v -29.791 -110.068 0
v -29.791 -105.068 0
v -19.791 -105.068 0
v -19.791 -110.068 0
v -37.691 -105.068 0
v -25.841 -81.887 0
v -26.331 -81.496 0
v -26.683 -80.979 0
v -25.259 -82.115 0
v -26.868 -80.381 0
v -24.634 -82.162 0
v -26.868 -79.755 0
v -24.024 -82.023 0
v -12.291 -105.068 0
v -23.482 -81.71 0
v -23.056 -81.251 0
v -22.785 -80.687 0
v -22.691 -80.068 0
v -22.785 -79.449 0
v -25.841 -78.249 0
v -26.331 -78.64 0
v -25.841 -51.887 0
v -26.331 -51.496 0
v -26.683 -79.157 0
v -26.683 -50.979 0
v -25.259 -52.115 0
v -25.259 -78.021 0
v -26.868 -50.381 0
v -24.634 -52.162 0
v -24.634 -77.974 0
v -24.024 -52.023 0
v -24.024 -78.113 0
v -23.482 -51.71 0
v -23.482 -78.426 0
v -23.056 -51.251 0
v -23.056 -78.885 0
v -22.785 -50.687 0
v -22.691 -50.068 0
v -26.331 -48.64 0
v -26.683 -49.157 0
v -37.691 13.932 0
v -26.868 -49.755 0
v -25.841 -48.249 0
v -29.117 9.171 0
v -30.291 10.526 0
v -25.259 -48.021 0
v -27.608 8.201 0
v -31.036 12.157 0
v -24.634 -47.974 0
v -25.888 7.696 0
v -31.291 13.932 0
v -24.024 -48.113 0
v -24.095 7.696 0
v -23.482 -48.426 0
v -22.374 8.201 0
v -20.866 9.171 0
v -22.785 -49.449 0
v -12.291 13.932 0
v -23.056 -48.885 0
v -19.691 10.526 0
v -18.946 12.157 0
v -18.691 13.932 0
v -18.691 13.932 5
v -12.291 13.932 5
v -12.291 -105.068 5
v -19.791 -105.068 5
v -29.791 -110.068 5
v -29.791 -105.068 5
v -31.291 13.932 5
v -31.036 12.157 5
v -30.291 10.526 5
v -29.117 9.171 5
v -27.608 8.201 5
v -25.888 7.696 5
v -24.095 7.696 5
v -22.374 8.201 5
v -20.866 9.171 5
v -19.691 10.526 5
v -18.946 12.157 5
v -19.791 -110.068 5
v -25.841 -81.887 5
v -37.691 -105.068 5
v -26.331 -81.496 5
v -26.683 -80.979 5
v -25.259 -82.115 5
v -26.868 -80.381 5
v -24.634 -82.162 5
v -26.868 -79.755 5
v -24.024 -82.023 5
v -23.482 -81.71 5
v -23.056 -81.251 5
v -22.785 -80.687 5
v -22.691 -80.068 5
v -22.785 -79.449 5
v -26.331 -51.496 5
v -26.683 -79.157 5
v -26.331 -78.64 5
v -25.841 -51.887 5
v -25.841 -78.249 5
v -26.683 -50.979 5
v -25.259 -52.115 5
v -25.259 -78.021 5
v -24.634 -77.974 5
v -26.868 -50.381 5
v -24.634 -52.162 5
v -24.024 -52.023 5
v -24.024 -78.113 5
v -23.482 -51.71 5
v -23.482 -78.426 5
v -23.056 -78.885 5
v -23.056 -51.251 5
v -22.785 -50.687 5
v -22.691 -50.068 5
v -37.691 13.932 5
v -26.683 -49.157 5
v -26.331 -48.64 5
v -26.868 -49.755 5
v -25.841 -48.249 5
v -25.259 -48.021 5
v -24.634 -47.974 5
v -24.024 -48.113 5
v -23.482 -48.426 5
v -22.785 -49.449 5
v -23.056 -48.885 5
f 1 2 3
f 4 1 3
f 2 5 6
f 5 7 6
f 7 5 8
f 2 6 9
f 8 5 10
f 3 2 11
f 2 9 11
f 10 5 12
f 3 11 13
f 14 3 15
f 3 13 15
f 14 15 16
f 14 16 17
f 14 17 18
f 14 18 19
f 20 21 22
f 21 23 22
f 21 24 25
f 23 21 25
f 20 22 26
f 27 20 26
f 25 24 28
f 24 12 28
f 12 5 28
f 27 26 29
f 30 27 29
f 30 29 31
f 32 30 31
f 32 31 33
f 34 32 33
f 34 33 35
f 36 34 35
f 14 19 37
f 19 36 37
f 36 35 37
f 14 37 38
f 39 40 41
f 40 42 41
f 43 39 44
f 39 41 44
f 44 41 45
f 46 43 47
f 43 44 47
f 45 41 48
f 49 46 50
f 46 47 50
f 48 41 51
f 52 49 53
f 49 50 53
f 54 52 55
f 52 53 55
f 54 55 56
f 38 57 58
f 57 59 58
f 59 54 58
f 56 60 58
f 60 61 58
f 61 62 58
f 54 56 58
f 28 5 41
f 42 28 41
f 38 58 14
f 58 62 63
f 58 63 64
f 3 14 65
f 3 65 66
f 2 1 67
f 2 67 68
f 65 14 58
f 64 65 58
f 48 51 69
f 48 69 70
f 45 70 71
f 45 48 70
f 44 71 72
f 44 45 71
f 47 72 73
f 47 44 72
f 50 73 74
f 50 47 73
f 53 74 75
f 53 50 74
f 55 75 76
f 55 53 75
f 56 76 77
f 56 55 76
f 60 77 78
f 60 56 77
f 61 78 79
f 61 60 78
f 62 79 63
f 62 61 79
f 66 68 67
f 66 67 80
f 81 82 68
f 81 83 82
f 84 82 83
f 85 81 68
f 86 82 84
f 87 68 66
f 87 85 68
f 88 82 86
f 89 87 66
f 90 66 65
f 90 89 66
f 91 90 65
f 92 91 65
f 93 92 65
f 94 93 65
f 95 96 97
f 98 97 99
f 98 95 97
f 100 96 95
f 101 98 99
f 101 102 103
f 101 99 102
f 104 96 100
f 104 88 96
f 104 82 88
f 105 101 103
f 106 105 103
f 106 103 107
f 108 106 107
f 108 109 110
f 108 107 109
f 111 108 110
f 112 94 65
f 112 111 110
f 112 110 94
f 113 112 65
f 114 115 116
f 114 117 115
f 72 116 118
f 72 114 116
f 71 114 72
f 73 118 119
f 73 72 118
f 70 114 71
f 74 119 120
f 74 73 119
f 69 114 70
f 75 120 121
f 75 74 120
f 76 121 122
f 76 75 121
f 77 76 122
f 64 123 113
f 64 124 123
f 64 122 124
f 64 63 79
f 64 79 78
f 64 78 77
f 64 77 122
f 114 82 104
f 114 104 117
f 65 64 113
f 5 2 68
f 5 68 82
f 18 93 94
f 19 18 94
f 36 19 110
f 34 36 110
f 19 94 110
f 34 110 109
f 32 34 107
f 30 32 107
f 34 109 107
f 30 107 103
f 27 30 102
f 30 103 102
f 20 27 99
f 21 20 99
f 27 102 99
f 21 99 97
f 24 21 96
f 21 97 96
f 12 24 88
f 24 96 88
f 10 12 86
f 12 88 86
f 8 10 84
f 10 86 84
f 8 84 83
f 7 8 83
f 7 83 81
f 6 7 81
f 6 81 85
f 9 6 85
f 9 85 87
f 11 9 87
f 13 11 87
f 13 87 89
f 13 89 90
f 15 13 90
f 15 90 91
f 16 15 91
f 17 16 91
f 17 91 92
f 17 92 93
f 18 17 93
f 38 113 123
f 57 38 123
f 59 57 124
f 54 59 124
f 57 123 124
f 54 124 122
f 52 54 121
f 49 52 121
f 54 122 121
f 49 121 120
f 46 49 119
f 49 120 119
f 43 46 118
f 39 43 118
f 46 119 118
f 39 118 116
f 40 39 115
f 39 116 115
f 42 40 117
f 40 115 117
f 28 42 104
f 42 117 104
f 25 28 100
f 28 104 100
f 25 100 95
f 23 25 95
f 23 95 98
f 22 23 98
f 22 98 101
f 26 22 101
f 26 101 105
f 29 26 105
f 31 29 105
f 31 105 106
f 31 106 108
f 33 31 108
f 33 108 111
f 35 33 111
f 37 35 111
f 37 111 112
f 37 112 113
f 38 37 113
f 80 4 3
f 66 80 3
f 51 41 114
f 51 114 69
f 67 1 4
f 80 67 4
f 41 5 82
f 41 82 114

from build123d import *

# Parameters (mm, degrees)
SKETCH1_W           = 25.4
SKETCH1_H           = 124
BOSS_EXTRUDE1_DEPTH = 5
SKETCH2_R           = 2.1
CUT_EXTRUDE1_DEPTH  = 35
SKETCH5_W           = 7.5
SKETCH5_H           = 5
SKETCH5_W_2         = 7.9
CUT_EXTRUDE3_DEPTH  = 10
CUT_EXTRUDE4_DEPTH  = 10


with BuildPart() as part:
    # Sketch1 → Boss-Extrude1 (new body)
    with BuildSketch(Plane.XY):
        with Locations((-24.991212543, -48.06789091)):
            Rectangle(SKETCH1_W, SKETCH1_H)
    extrude(amount=BOSS_EXTRUDE1_DEPTH)

    # Sketch2 → Cut-Extrude1 (cut)
    with BuildSketch(Plane.XY.offset(5)):
        with Locations((-24.791212543, -50.06789091)):
            Circle(SKETCH2_R)
        with Locations((-24.791212543, -80.06789091)):
            Circle(SKETCH2_R)
    extrude(amount=-CUT_EXTRUDE1_DEPTH, mode=Mode.SUBTRACT)

    # Sketch5 → Cut-Extrude3 (cut)
    with BuildSketch(Plane(origin=(0, 0, 0), x_dir=(-1, 0, 0), z_dir=(0, 0, -1))):
        with Locations((16.041212543, -107.56789091)):
            Rectangle(SKETCH5_W, SKETCH5_H)
        with Locations((33.741212543, -107.56789091)):
            Rectangle(SKETCH5_W_2, SKETCH5_H)
    extrude(amount=-CUT_EXTRUDE3_DEPTH, mode=Mode.SUBTRACT)

    # Sketch7 → Cut-Extrude4 (cut)
    with BuildSketch(Plane(origin=(0, 0, 0), x_dir=(-1, 0, 0), z_dir=(0, 0, -1))):
        with BuildLine():
            Line((18.691212543, 13.93210909), (31.291212543, 13.93210909))
            ThreePointArc((31.291212543, 13.93210909), (24.991212543, 7.63210909), (18.691212543, 13.93210909))
        make_face()
    extrude(amount=-CUT_EXTRUDE4_DEPTH, mode=Mode.SUBTRACT)


solid = part.part
